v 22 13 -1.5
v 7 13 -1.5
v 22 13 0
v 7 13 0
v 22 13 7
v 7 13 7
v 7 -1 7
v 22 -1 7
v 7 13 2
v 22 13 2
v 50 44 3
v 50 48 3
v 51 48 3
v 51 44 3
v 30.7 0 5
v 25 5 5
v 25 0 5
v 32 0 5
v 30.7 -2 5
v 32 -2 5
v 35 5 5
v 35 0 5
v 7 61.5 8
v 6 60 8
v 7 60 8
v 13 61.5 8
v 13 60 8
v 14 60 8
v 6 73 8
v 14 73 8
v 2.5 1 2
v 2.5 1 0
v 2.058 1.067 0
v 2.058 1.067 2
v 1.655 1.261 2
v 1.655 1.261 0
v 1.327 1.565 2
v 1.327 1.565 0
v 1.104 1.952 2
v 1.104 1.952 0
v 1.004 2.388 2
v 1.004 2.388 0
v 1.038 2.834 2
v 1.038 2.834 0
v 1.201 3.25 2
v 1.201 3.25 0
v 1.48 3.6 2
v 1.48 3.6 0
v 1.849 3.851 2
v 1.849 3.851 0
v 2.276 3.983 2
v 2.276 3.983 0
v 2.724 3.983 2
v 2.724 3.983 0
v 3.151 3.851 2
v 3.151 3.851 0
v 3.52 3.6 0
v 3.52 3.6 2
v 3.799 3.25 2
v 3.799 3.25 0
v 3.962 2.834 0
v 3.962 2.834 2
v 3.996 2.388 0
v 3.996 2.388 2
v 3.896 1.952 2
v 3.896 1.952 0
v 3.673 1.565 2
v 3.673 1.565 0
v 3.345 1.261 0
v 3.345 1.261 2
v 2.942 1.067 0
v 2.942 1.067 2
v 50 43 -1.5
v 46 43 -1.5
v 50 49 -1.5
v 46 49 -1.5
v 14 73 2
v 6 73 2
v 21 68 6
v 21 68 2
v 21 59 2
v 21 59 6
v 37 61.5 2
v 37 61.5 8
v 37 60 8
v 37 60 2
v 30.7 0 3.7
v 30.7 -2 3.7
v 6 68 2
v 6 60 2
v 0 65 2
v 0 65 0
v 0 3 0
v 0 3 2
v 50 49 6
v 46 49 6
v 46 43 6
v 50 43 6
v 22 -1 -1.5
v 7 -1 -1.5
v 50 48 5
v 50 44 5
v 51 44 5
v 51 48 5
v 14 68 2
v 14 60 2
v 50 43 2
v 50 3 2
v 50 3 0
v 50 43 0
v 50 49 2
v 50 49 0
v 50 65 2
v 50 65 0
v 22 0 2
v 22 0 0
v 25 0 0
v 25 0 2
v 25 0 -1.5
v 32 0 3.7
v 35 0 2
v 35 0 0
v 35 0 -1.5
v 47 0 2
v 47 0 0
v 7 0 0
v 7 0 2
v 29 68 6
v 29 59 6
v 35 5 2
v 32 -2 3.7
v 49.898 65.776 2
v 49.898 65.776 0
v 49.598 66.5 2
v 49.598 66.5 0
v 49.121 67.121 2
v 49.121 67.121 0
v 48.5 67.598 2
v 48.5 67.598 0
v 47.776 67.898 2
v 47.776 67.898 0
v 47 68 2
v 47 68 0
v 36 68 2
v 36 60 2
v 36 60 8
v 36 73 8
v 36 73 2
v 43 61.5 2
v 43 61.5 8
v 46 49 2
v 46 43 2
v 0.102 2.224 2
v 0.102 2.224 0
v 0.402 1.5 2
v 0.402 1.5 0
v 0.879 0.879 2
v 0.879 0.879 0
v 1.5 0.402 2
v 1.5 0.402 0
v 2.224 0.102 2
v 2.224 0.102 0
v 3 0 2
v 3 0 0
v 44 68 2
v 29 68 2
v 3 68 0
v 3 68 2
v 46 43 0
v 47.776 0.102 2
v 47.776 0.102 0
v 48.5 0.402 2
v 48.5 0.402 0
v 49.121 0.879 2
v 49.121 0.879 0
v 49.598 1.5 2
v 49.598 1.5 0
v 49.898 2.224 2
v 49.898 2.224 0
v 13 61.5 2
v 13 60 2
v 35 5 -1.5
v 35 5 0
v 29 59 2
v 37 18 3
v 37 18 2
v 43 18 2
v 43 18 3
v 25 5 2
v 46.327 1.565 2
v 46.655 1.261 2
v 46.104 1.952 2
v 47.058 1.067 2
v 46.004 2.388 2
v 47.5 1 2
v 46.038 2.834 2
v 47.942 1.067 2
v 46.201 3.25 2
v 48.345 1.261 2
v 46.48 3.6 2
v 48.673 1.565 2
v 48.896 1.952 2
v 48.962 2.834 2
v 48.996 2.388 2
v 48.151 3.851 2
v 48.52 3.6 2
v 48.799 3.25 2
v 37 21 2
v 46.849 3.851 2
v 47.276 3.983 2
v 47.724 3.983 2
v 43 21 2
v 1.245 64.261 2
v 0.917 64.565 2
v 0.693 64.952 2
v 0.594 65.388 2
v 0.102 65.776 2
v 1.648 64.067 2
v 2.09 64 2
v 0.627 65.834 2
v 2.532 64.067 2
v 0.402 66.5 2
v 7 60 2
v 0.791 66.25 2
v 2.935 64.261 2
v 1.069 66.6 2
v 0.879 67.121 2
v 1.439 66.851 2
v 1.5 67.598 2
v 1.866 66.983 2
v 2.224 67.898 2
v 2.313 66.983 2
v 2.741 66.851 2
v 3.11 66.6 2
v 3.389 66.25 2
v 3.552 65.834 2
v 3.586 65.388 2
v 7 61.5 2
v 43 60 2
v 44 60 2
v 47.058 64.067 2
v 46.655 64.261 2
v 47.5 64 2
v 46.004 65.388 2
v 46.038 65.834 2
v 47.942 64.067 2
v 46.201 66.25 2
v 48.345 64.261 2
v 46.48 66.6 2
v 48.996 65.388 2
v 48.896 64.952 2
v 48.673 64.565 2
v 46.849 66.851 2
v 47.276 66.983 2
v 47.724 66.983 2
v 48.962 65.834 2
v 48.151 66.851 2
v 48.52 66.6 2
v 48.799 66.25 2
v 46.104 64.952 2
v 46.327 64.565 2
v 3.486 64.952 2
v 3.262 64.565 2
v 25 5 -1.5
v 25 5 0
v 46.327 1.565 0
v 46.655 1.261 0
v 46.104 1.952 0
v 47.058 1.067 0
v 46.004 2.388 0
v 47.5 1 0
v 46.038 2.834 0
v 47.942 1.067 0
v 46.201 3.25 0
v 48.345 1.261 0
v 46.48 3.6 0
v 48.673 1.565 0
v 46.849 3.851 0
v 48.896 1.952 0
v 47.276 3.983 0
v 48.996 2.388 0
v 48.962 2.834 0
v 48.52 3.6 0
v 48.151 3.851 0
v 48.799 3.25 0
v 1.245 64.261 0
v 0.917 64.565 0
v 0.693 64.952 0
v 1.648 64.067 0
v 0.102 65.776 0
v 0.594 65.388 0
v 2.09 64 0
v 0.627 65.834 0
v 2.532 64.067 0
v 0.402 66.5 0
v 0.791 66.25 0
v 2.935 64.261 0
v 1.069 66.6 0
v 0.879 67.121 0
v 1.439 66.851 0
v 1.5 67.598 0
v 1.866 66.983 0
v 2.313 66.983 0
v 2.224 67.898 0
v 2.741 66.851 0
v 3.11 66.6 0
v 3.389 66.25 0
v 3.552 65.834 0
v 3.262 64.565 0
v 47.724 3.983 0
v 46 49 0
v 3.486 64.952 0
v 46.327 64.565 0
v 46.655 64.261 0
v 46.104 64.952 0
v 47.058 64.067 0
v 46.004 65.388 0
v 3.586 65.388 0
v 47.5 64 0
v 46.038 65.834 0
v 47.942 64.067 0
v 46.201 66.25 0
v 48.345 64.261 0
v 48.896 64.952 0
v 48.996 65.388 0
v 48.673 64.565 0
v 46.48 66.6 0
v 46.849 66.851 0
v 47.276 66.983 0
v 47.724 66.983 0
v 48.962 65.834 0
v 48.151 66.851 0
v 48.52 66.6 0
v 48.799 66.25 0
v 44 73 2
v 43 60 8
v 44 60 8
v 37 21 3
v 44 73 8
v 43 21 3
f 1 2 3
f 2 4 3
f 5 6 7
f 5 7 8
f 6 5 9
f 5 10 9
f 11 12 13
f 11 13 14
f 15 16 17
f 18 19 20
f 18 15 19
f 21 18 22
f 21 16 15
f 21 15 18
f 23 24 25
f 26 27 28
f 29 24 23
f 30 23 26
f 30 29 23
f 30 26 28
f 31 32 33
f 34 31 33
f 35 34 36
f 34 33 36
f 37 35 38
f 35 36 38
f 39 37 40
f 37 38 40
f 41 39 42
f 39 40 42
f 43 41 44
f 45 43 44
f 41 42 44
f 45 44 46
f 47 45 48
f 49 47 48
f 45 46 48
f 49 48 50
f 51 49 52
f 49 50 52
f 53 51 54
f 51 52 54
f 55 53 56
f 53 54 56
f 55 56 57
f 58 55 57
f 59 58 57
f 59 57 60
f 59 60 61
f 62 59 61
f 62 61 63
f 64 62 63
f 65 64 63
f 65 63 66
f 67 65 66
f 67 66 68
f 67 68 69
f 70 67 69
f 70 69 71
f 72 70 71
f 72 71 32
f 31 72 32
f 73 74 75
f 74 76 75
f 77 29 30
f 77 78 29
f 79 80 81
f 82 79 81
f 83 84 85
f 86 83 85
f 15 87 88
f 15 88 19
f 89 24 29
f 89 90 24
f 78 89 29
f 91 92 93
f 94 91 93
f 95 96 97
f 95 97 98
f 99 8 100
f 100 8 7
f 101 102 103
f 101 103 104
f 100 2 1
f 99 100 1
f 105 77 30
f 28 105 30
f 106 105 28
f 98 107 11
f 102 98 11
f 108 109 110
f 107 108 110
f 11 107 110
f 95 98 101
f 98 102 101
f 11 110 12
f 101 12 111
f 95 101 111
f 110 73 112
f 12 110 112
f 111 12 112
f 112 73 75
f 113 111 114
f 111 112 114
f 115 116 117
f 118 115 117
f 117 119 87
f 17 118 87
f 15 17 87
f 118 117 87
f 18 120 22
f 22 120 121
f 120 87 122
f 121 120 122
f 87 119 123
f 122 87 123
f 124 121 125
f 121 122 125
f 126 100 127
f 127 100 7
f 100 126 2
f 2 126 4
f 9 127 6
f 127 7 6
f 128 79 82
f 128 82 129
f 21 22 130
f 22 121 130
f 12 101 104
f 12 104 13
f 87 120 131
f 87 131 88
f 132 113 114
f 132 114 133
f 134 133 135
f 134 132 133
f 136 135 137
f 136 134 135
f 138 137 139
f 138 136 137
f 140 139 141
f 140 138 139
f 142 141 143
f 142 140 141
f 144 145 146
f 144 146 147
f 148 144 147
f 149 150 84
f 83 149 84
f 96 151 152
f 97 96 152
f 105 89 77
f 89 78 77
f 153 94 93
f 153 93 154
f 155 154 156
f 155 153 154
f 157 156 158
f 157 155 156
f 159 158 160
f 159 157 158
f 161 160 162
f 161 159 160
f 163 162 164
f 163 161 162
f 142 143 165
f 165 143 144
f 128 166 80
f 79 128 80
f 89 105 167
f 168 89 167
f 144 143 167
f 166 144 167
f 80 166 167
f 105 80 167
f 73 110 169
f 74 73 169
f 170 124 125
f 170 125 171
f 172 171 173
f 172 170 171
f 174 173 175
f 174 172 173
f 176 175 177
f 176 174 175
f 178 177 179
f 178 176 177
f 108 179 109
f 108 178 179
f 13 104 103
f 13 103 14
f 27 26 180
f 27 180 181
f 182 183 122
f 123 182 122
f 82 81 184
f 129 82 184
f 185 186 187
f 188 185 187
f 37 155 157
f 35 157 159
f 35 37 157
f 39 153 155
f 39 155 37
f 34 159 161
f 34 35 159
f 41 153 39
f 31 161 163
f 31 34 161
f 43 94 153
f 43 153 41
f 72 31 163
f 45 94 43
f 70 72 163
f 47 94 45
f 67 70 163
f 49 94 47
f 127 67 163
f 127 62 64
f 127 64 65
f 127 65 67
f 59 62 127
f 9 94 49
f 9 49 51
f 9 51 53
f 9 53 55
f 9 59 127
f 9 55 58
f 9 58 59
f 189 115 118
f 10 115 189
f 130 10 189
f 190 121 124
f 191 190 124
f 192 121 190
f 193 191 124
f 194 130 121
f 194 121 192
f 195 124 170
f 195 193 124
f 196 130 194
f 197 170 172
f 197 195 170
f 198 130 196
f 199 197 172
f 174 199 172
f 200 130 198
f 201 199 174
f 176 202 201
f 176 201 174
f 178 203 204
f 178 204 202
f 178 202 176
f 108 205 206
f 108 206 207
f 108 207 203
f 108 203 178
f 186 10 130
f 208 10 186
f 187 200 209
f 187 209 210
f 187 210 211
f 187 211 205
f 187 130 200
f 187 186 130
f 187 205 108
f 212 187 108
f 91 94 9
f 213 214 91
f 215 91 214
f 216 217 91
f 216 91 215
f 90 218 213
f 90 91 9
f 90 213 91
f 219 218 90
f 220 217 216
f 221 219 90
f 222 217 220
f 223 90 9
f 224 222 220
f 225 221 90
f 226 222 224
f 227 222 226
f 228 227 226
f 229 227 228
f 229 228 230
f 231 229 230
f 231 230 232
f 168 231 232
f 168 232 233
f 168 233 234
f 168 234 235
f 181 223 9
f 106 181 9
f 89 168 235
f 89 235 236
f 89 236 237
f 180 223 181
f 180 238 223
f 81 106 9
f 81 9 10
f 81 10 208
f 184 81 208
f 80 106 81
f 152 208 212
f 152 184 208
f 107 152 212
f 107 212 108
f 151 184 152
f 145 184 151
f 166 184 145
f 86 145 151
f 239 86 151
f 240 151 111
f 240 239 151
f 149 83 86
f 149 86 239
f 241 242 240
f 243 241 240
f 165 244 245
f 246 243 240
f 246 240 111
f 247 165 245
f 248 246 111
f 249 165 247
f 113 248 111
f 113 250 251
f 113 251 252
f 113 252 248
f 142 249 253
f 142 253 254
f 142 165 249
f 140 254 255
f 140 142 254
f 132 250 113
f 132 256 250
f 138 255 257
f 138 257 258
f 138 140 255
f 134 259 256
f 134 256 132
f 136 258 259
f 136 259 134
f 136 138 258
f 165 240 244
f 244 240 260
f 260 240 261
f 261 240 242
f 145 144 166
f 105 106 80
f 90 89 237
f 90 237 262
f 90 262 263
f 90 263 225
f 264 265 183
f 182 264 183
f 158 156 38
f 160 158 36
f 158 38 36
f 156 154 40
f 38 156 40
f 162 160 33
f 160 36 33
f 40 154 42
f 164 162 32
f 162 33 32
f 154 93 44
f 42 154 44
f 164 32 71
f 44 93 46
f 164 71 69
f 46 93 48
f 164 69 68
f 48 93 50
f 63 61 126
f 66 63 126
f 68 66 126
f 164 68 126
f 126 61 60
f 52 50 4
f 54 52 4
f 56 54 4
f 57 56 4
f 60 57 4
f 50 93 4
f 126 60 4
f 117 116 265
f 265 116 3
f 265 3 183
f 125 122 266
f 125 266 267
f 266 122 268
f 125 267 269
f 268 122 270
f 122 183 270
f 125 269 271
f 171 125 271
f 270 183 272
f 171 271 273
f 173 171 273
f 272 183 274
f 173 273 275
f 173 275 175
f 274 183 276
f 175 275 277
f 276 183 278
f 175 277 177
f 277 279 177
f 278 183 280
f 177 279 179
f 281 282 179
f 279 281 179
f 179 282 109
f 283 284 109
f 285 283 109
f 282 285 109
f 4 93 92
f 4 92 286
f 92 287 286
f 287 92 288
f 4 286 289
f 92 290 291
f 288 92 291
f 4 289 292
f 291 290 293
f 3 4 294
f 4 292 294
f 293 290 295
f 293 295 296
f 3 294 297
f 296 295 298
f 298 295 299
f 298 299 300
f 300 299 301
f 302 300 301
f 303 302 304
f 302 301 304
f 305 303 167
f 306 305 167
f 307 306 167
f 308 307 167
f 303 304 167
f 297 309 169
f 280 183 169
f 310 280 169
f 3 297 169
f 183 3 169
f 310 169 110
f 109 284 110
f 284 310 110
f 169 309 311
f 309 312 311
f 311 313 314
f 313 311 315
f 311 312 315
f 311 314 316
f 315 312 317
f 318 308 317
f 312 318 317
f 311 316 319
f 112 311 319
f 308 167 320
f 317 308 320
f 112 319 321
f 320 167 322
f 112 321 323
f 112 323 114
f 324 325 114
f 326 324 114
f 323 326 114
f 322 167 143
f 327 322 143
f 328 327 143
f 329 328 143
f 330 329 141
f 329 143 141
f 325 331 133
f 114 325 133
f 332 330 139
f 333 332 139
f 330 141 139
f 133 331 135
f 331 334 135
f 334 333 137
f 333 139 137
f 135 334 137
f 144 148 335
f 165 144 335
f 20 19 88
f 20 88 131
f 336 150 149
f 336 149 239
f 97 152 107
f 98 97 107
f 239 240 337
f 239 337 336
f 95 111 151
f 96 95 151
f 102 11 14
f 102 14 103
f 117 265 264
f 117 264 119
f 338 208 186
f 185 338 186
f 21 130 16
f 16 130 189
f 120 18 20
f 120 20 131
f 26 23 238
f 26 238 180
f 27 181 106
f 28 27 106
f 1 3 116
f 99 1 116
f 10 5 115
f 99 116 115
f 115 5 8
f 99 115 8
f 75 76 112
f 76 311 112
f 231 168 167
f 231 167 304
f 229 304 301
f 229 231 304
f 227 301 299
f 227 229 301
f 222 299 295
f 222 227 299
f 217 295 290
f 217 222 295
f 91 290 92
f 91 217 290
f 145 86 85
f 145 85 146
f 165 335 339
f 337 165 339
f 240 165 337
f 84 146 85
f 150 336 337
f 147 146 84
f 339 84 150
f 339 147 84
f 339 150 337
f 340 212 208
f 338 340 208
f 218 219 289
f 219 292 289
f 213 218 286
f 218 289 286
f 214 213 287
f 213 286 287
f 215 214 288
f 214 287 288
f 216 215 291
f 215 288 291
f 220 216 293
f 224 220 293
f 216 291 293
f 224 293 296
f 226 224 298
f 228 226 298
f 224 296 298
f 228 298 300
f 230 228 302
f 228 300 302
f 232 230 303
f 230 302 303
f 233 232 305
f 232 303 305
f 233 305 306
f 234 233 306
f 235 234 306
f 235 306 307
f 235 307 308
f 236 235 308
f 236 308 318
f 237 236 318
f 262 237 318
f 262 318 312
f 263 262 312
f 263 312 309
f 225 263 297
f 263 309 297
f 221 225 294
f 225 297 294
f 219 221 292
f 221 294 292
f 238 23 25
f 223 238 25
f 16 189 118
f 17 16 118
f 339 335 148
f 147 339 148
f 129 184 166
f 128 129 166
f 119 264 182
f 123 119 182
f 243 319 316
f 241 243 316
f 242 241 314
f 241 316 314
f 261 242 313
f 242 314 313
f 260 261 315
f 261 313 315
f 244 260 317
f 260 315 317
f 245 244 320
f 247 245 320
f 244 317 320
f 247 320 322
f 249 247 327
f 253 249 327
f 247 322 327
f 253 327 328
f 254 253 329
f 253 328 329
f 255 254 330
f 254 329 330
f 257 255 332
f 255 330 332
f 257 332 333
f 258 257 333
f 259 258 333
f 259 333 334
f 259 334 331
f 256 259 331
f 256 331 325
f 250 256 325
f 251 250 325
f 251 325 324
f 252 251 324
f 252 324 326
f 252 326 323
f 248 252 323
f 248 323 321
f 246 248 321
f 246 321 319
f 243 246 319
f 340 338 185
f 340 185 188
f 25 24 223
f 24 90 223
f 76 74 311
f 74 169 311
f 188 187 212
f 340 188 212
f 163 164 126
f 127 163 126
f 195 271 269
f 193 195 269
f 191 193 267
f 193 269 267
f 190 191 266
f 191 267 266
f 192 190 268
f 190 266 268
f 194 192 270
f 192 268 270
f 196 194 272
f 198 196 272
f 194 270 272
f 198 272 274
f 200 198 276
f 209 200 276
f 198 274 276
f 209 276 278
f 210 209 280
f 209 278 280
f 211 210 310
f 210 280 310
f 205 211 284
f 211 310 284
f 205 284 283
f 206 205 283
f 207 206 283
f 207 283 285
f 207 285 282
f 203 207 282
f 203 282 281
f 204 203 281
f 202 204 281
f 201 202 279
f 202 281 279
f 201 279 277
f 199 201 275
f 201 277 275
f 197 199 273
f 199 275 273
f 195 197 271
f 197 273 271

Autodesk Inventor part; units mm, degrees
ref_plane "YZ Plane" through (0, 0, 0) normal (1, 0, 0) x (0, 1, 0)
ref_plane "XZ Plane" through (0, 0, 0) normal (0, 1, 0) x (-1, 0, 0)
ref_plane "XY Plane" through (0, 0, 0) normal (0, 0, 1) x (1, 0, 0)
sketch "Boceto1" plane through (0, 0, 0) normal (0, 0, 1) x (1, 0, 0)
  line L0 (0, 0) -> (50, 0)
  line L1 (50, 0) -> (50, 68)
  line L2 (50, 68) -> (0, 68)
  line L3 (0, 68) -> (0, 0)
  dimension "d0" = 50
  dimension "d1" = 68
extrude "Extrusión1" add sketch "Boceto1" along normal blind 2
hole "Hole1" at (2.0897, 65.5, 2) direction (0, 0, -1) diameter 3 end through all
hole "Hole2" at (47.5, 65.5, 2) direction (0, 0, -1) diameter 3 end through all
hole "Hole3" at (2.5, 2.5, 2) direction (0, 0, -1) diameter 3 end through all
hole "Hole4" at (47.5, 2.5, 2) direction (0, 0, -1) diameter 3 end through all
fillet "Empalme1" radius 3 1 edges at (50, 68, 1)
fillet "Empalme2" radius 3 1 edges at (0, 68, 1)
fillet "Empalme3" radius 3 1 edges at (0, 0, 1)
fillet "Empalme4" radius 3 1 edges at (50, 0, 1)
sketch "Boceto2" plane through (0, 0, 2) normal (0, 0, 1) x (1, 0, 0)
  line L0 (3, 68) -> (47, 68) projected
  line L1 (6, 68) -> (6, 60)
  line L2 (6, 60) -> (14, 60)
  line L3 (14, 60) -> (14, 68)
  line L4 (47, 0) -> (3, 0) projected
  line L5 (6, 68) -> (6, 73)
  line L6 (6, 73) -> (14, 73)
  line L7 (14, 73) -> (14, 68)
  point P0 (0, 0)
  dimension "d47" = 8
  dimension "d48" = 8
  dimension "d49" = 8
  dimension "d63" = 5
extrude "Extrusión2" add sketch "Boceto2" along normal blind 6
sketch "Boceto3" plane through (0, 0, 8) normal (0, 0, 1) x (1, 0, 0)
  line L0 (6, 60) -> (6, 73) projected
  line L1 (14, 60) -> (6, 60) projected
  line L2 (14, 73) -> (14, 60) projected
  line L3 (6, 60) -> (7, 60)
  line L4 (7, 61.5) -> (6, 61.5)
  line L5 (7, 61.5) -> (7, 60)
  line L6 (14, 60) -> (13, 60)
  line L7 (13, 61.5) -> (14, 61.5)
  line L8 (13, 61.5) -> (13, 60)
  line L9 (7, 61.5) -> (13, 61.5)
  point P0 (14, 68)
  point P1 (6, 68)
  point P2 (0, 0)
extrude "Extrusión3" cut sketch "Boceto3" against normal blind 6 contours L5 L9 L8 L1
sketch "Boceto4" plane through (0, 0, 2) normal (0, 0, 1) x (1, 0, 0)
  line L0 (14, 68) -> (14, 60) projected
  line L1 (6, 60) -> (6, 68) projected
  line L2 (3, 68) -> (47, 68) projected
  line L3 (6, 68) -> (14, 68)
  line L4 (21, 68) -> (21, 59)
  line L5 (21, 59) -> (29, 59)
  line L6 (29, 59) -> (29, 68)
  line L7 (21, 68) -> (29, 68)
  point P0 (0, 0)
  dimension "d55" = 8
extrude "Extrusión4" add sketch "Boceto4" along normal blind 4
sketch "Boceto5" plane through (0, 0, 2) normal (0, 0, 1) x (1, 0, 0)
  line L0 (29, 68) -> (47, 68) projected
  line L1 (50, 68) -> (44, 68)
  line L2 (44, 68) -> (44, 60)
  line L3 (44, 60) -> (36, 60)
  line L4 (36, 60) -> (36, 73)
  line L5 (44, 73) -> (44, 65.5)
  line L6 (44, 73) -> (36, 73)
  point P0 (0, 0)
  dimension "d58" = 6
  dimension "d59" = 8
  dimension "d60" = 13
extrude "Extrusión5" add sketch "Boceto5" along normal blind 6
sketch "Boceto6" plane through (0, 0, 8) normal (0, 0, 1) x (1, 0, 0)
  line L0 (44, 60) -> (36, 60) projected
  line L1 (37, 61.5) -> (37, 60)
  line L2 (43, 61.5) -> (43, 60)
  line L3 (43, 61.5) -> (37, 61.5)
  line L4 (37, 61.5) -> (37, 60)
  line L5 (43, 60.1438) -> (43, 61.5)
  line L6 (37, 60) -> (43, 60)
  point P0 (0, 0)
extrude "Extrusión6" cut sketch "Boceto6" against normal blind 6
sketch "Boceto7" plane through (0, 0, 2) normal (0, 0, 1) x (1, 0, 0)
  line L0 (0, 3) -> (0, 65) projected
  line L1 (47, 0) -> (3, 0) projected
  line L2 (7, 0) -> (7, -1)
  line L3 (7, -1) -> (22, -1)
  line L4 (22, -1) -> (22, 13)
  line L5 (22, 13) -> (7, 13)
  line L6 (7, 13) -> (7, 0)
  point P0 (0, 0)
extrude "Extrusión7" add sketch "Boceto7" along normal blind 5
sketch "Boceto8" plane through (0, 0, 2) normal (0, 0, 1) x (1, 0, 0)
  line L0 (47, 0) -> (22, 0) projected
  line L1 (35, 0) -> (35, 5)
  line L2 (35, 5) -> (25, 5)
  line L3 (25, 5) -> (25, 0)
  line L4 (35, 0) -> (25, 0)
  point P0 (0, 0)
  dimension "d74" = 5
extrude "Extrusión8" add sketch "Boceto8" along normal blind 3
sketch "Boceto9" plane through (3, 0, 0) normal (0, -1, 0) x (1, 0, 0)
  line L0 (29, 5) -> (22, 5)
  line L1 (32, 5) -> (29, 5)
  line L2 (29, 5) -> (29, 3.7)
  line L3 (29, 3.7) -> (27.7, 3.7)
  line L4 (27.7, 3.7) -> (27.7, 5)
  line L5 (29, 5) -> (27.7, 5)
  point P0 (-3, 0)
  dimension "d78" = 1.3
  dimension "d79" = 1.3
extrude "Extrusión9" add sketch "Boceto9" along normal blind 2
sketch "Boceto10" plane through (0, 0, 2) normal (0, 0, 1) x (1, 0, 0)
  line L0 (50, 65) -> (50, 3) projected
  line L1 (50, 49) -> (46, 49)
  line L2 (46, 49) -> (46, 43)
  line L3 (46, 43) -> (50, 43)
  line L4 (50, 49) -> (50, 43)
  point P0 (0, 0)
  dimension "d83" = 6
extrude "Extrusión10" add sketch "Boceto10" along normal blind 4
sketch "Boceto11" plane through (50, 65, 2) normal (1, 0, 0) x (0, 0, -1)
  line L0 (-3, -17) -> (-1, -17)
  line L1 (-1, -17) -> (-1, -21)
  line L2 (-1, -21) -> (-3, -21)
  line L3 (-3, -21) -> (-3, -17)
  point P0 (2, -65)
extrude "Extrusión11" add sketch "Boceto11" along normal blind 1
sketch "Boceto12" plane through (0, 0, 2) normal (0, 0, 1) x (1, 0, 0)
  line L0 (47, 0) -> (35, 0) projected
  line L1 (43, 18) -> (43, 21)
  line L2 (43, 21) -> (37, 21)
  line L3 (37, 21) -> (37, 18)
  line L4 (37, 18) -> (43, 18)
  point P0 (0, 0)
  dimension "d90" = 3
  dimension "d91" = 6
extrude "Extrusión12" add sketch "Boceto12" along normal blind 1
sketch "Boceto13" plane through (0, 0, 5) normal (0, 0, 1) x (1, 0, 0)
  line L0 (35, 5) -> (35, 0) projected
  line L1 (30.7, 0) -> (25, 0) projected
  line L2 (32, 0) -> (32, -2) projected
  line L3 (25, 5) -> (35, 5)
  line L4 (35, 0) -> (25, 0)
  line L5 (25, 5) -> (25, 0)
  line L6 (35, 5) -> (35, 0)
  point P0 (0, 0)
extrude "Extrusión13" add sketch "Boceto13" against normal blind 6.5
sketch "Boceto14" plane through (0, 0, 7) normal (0, 0, 1) x (1, 0, 0)
  line L0 (7, -1) -> (7, 13) projected
  line L1 (22, -1) -> (7, -1) projected
  line L2 (22, 13) -> (22, -1) projected
  line L3 (7, 13) -> (22, 13) projected
  line L4 (7, 13) -> (22, 13)
  line L5 (22, -1) -> (7, -1)
  point P0 (0, 0)
extrude "Extrusión14" add sketch "Boceto14" against normal blind 8.5
sketch "Boceto15" plane through (0, 0, 6) normal (0, 0, 1) x (1, 0, 0)
  line L0 (50, 49) -> (50, 43) projected
  line L1 (46, 49) -> (50, 49) projected
  line L2 (46, 49) -> (50, 49)
  line L3 (50, 43) -> (46, 43)
  line L4 (46, 43) -> (46, 49)
  point P0 (0, 0)
extrude "Extrusión15" add sketch "Boceto15" against normal blind 7.5
properties part number "lipoRiderPro"
